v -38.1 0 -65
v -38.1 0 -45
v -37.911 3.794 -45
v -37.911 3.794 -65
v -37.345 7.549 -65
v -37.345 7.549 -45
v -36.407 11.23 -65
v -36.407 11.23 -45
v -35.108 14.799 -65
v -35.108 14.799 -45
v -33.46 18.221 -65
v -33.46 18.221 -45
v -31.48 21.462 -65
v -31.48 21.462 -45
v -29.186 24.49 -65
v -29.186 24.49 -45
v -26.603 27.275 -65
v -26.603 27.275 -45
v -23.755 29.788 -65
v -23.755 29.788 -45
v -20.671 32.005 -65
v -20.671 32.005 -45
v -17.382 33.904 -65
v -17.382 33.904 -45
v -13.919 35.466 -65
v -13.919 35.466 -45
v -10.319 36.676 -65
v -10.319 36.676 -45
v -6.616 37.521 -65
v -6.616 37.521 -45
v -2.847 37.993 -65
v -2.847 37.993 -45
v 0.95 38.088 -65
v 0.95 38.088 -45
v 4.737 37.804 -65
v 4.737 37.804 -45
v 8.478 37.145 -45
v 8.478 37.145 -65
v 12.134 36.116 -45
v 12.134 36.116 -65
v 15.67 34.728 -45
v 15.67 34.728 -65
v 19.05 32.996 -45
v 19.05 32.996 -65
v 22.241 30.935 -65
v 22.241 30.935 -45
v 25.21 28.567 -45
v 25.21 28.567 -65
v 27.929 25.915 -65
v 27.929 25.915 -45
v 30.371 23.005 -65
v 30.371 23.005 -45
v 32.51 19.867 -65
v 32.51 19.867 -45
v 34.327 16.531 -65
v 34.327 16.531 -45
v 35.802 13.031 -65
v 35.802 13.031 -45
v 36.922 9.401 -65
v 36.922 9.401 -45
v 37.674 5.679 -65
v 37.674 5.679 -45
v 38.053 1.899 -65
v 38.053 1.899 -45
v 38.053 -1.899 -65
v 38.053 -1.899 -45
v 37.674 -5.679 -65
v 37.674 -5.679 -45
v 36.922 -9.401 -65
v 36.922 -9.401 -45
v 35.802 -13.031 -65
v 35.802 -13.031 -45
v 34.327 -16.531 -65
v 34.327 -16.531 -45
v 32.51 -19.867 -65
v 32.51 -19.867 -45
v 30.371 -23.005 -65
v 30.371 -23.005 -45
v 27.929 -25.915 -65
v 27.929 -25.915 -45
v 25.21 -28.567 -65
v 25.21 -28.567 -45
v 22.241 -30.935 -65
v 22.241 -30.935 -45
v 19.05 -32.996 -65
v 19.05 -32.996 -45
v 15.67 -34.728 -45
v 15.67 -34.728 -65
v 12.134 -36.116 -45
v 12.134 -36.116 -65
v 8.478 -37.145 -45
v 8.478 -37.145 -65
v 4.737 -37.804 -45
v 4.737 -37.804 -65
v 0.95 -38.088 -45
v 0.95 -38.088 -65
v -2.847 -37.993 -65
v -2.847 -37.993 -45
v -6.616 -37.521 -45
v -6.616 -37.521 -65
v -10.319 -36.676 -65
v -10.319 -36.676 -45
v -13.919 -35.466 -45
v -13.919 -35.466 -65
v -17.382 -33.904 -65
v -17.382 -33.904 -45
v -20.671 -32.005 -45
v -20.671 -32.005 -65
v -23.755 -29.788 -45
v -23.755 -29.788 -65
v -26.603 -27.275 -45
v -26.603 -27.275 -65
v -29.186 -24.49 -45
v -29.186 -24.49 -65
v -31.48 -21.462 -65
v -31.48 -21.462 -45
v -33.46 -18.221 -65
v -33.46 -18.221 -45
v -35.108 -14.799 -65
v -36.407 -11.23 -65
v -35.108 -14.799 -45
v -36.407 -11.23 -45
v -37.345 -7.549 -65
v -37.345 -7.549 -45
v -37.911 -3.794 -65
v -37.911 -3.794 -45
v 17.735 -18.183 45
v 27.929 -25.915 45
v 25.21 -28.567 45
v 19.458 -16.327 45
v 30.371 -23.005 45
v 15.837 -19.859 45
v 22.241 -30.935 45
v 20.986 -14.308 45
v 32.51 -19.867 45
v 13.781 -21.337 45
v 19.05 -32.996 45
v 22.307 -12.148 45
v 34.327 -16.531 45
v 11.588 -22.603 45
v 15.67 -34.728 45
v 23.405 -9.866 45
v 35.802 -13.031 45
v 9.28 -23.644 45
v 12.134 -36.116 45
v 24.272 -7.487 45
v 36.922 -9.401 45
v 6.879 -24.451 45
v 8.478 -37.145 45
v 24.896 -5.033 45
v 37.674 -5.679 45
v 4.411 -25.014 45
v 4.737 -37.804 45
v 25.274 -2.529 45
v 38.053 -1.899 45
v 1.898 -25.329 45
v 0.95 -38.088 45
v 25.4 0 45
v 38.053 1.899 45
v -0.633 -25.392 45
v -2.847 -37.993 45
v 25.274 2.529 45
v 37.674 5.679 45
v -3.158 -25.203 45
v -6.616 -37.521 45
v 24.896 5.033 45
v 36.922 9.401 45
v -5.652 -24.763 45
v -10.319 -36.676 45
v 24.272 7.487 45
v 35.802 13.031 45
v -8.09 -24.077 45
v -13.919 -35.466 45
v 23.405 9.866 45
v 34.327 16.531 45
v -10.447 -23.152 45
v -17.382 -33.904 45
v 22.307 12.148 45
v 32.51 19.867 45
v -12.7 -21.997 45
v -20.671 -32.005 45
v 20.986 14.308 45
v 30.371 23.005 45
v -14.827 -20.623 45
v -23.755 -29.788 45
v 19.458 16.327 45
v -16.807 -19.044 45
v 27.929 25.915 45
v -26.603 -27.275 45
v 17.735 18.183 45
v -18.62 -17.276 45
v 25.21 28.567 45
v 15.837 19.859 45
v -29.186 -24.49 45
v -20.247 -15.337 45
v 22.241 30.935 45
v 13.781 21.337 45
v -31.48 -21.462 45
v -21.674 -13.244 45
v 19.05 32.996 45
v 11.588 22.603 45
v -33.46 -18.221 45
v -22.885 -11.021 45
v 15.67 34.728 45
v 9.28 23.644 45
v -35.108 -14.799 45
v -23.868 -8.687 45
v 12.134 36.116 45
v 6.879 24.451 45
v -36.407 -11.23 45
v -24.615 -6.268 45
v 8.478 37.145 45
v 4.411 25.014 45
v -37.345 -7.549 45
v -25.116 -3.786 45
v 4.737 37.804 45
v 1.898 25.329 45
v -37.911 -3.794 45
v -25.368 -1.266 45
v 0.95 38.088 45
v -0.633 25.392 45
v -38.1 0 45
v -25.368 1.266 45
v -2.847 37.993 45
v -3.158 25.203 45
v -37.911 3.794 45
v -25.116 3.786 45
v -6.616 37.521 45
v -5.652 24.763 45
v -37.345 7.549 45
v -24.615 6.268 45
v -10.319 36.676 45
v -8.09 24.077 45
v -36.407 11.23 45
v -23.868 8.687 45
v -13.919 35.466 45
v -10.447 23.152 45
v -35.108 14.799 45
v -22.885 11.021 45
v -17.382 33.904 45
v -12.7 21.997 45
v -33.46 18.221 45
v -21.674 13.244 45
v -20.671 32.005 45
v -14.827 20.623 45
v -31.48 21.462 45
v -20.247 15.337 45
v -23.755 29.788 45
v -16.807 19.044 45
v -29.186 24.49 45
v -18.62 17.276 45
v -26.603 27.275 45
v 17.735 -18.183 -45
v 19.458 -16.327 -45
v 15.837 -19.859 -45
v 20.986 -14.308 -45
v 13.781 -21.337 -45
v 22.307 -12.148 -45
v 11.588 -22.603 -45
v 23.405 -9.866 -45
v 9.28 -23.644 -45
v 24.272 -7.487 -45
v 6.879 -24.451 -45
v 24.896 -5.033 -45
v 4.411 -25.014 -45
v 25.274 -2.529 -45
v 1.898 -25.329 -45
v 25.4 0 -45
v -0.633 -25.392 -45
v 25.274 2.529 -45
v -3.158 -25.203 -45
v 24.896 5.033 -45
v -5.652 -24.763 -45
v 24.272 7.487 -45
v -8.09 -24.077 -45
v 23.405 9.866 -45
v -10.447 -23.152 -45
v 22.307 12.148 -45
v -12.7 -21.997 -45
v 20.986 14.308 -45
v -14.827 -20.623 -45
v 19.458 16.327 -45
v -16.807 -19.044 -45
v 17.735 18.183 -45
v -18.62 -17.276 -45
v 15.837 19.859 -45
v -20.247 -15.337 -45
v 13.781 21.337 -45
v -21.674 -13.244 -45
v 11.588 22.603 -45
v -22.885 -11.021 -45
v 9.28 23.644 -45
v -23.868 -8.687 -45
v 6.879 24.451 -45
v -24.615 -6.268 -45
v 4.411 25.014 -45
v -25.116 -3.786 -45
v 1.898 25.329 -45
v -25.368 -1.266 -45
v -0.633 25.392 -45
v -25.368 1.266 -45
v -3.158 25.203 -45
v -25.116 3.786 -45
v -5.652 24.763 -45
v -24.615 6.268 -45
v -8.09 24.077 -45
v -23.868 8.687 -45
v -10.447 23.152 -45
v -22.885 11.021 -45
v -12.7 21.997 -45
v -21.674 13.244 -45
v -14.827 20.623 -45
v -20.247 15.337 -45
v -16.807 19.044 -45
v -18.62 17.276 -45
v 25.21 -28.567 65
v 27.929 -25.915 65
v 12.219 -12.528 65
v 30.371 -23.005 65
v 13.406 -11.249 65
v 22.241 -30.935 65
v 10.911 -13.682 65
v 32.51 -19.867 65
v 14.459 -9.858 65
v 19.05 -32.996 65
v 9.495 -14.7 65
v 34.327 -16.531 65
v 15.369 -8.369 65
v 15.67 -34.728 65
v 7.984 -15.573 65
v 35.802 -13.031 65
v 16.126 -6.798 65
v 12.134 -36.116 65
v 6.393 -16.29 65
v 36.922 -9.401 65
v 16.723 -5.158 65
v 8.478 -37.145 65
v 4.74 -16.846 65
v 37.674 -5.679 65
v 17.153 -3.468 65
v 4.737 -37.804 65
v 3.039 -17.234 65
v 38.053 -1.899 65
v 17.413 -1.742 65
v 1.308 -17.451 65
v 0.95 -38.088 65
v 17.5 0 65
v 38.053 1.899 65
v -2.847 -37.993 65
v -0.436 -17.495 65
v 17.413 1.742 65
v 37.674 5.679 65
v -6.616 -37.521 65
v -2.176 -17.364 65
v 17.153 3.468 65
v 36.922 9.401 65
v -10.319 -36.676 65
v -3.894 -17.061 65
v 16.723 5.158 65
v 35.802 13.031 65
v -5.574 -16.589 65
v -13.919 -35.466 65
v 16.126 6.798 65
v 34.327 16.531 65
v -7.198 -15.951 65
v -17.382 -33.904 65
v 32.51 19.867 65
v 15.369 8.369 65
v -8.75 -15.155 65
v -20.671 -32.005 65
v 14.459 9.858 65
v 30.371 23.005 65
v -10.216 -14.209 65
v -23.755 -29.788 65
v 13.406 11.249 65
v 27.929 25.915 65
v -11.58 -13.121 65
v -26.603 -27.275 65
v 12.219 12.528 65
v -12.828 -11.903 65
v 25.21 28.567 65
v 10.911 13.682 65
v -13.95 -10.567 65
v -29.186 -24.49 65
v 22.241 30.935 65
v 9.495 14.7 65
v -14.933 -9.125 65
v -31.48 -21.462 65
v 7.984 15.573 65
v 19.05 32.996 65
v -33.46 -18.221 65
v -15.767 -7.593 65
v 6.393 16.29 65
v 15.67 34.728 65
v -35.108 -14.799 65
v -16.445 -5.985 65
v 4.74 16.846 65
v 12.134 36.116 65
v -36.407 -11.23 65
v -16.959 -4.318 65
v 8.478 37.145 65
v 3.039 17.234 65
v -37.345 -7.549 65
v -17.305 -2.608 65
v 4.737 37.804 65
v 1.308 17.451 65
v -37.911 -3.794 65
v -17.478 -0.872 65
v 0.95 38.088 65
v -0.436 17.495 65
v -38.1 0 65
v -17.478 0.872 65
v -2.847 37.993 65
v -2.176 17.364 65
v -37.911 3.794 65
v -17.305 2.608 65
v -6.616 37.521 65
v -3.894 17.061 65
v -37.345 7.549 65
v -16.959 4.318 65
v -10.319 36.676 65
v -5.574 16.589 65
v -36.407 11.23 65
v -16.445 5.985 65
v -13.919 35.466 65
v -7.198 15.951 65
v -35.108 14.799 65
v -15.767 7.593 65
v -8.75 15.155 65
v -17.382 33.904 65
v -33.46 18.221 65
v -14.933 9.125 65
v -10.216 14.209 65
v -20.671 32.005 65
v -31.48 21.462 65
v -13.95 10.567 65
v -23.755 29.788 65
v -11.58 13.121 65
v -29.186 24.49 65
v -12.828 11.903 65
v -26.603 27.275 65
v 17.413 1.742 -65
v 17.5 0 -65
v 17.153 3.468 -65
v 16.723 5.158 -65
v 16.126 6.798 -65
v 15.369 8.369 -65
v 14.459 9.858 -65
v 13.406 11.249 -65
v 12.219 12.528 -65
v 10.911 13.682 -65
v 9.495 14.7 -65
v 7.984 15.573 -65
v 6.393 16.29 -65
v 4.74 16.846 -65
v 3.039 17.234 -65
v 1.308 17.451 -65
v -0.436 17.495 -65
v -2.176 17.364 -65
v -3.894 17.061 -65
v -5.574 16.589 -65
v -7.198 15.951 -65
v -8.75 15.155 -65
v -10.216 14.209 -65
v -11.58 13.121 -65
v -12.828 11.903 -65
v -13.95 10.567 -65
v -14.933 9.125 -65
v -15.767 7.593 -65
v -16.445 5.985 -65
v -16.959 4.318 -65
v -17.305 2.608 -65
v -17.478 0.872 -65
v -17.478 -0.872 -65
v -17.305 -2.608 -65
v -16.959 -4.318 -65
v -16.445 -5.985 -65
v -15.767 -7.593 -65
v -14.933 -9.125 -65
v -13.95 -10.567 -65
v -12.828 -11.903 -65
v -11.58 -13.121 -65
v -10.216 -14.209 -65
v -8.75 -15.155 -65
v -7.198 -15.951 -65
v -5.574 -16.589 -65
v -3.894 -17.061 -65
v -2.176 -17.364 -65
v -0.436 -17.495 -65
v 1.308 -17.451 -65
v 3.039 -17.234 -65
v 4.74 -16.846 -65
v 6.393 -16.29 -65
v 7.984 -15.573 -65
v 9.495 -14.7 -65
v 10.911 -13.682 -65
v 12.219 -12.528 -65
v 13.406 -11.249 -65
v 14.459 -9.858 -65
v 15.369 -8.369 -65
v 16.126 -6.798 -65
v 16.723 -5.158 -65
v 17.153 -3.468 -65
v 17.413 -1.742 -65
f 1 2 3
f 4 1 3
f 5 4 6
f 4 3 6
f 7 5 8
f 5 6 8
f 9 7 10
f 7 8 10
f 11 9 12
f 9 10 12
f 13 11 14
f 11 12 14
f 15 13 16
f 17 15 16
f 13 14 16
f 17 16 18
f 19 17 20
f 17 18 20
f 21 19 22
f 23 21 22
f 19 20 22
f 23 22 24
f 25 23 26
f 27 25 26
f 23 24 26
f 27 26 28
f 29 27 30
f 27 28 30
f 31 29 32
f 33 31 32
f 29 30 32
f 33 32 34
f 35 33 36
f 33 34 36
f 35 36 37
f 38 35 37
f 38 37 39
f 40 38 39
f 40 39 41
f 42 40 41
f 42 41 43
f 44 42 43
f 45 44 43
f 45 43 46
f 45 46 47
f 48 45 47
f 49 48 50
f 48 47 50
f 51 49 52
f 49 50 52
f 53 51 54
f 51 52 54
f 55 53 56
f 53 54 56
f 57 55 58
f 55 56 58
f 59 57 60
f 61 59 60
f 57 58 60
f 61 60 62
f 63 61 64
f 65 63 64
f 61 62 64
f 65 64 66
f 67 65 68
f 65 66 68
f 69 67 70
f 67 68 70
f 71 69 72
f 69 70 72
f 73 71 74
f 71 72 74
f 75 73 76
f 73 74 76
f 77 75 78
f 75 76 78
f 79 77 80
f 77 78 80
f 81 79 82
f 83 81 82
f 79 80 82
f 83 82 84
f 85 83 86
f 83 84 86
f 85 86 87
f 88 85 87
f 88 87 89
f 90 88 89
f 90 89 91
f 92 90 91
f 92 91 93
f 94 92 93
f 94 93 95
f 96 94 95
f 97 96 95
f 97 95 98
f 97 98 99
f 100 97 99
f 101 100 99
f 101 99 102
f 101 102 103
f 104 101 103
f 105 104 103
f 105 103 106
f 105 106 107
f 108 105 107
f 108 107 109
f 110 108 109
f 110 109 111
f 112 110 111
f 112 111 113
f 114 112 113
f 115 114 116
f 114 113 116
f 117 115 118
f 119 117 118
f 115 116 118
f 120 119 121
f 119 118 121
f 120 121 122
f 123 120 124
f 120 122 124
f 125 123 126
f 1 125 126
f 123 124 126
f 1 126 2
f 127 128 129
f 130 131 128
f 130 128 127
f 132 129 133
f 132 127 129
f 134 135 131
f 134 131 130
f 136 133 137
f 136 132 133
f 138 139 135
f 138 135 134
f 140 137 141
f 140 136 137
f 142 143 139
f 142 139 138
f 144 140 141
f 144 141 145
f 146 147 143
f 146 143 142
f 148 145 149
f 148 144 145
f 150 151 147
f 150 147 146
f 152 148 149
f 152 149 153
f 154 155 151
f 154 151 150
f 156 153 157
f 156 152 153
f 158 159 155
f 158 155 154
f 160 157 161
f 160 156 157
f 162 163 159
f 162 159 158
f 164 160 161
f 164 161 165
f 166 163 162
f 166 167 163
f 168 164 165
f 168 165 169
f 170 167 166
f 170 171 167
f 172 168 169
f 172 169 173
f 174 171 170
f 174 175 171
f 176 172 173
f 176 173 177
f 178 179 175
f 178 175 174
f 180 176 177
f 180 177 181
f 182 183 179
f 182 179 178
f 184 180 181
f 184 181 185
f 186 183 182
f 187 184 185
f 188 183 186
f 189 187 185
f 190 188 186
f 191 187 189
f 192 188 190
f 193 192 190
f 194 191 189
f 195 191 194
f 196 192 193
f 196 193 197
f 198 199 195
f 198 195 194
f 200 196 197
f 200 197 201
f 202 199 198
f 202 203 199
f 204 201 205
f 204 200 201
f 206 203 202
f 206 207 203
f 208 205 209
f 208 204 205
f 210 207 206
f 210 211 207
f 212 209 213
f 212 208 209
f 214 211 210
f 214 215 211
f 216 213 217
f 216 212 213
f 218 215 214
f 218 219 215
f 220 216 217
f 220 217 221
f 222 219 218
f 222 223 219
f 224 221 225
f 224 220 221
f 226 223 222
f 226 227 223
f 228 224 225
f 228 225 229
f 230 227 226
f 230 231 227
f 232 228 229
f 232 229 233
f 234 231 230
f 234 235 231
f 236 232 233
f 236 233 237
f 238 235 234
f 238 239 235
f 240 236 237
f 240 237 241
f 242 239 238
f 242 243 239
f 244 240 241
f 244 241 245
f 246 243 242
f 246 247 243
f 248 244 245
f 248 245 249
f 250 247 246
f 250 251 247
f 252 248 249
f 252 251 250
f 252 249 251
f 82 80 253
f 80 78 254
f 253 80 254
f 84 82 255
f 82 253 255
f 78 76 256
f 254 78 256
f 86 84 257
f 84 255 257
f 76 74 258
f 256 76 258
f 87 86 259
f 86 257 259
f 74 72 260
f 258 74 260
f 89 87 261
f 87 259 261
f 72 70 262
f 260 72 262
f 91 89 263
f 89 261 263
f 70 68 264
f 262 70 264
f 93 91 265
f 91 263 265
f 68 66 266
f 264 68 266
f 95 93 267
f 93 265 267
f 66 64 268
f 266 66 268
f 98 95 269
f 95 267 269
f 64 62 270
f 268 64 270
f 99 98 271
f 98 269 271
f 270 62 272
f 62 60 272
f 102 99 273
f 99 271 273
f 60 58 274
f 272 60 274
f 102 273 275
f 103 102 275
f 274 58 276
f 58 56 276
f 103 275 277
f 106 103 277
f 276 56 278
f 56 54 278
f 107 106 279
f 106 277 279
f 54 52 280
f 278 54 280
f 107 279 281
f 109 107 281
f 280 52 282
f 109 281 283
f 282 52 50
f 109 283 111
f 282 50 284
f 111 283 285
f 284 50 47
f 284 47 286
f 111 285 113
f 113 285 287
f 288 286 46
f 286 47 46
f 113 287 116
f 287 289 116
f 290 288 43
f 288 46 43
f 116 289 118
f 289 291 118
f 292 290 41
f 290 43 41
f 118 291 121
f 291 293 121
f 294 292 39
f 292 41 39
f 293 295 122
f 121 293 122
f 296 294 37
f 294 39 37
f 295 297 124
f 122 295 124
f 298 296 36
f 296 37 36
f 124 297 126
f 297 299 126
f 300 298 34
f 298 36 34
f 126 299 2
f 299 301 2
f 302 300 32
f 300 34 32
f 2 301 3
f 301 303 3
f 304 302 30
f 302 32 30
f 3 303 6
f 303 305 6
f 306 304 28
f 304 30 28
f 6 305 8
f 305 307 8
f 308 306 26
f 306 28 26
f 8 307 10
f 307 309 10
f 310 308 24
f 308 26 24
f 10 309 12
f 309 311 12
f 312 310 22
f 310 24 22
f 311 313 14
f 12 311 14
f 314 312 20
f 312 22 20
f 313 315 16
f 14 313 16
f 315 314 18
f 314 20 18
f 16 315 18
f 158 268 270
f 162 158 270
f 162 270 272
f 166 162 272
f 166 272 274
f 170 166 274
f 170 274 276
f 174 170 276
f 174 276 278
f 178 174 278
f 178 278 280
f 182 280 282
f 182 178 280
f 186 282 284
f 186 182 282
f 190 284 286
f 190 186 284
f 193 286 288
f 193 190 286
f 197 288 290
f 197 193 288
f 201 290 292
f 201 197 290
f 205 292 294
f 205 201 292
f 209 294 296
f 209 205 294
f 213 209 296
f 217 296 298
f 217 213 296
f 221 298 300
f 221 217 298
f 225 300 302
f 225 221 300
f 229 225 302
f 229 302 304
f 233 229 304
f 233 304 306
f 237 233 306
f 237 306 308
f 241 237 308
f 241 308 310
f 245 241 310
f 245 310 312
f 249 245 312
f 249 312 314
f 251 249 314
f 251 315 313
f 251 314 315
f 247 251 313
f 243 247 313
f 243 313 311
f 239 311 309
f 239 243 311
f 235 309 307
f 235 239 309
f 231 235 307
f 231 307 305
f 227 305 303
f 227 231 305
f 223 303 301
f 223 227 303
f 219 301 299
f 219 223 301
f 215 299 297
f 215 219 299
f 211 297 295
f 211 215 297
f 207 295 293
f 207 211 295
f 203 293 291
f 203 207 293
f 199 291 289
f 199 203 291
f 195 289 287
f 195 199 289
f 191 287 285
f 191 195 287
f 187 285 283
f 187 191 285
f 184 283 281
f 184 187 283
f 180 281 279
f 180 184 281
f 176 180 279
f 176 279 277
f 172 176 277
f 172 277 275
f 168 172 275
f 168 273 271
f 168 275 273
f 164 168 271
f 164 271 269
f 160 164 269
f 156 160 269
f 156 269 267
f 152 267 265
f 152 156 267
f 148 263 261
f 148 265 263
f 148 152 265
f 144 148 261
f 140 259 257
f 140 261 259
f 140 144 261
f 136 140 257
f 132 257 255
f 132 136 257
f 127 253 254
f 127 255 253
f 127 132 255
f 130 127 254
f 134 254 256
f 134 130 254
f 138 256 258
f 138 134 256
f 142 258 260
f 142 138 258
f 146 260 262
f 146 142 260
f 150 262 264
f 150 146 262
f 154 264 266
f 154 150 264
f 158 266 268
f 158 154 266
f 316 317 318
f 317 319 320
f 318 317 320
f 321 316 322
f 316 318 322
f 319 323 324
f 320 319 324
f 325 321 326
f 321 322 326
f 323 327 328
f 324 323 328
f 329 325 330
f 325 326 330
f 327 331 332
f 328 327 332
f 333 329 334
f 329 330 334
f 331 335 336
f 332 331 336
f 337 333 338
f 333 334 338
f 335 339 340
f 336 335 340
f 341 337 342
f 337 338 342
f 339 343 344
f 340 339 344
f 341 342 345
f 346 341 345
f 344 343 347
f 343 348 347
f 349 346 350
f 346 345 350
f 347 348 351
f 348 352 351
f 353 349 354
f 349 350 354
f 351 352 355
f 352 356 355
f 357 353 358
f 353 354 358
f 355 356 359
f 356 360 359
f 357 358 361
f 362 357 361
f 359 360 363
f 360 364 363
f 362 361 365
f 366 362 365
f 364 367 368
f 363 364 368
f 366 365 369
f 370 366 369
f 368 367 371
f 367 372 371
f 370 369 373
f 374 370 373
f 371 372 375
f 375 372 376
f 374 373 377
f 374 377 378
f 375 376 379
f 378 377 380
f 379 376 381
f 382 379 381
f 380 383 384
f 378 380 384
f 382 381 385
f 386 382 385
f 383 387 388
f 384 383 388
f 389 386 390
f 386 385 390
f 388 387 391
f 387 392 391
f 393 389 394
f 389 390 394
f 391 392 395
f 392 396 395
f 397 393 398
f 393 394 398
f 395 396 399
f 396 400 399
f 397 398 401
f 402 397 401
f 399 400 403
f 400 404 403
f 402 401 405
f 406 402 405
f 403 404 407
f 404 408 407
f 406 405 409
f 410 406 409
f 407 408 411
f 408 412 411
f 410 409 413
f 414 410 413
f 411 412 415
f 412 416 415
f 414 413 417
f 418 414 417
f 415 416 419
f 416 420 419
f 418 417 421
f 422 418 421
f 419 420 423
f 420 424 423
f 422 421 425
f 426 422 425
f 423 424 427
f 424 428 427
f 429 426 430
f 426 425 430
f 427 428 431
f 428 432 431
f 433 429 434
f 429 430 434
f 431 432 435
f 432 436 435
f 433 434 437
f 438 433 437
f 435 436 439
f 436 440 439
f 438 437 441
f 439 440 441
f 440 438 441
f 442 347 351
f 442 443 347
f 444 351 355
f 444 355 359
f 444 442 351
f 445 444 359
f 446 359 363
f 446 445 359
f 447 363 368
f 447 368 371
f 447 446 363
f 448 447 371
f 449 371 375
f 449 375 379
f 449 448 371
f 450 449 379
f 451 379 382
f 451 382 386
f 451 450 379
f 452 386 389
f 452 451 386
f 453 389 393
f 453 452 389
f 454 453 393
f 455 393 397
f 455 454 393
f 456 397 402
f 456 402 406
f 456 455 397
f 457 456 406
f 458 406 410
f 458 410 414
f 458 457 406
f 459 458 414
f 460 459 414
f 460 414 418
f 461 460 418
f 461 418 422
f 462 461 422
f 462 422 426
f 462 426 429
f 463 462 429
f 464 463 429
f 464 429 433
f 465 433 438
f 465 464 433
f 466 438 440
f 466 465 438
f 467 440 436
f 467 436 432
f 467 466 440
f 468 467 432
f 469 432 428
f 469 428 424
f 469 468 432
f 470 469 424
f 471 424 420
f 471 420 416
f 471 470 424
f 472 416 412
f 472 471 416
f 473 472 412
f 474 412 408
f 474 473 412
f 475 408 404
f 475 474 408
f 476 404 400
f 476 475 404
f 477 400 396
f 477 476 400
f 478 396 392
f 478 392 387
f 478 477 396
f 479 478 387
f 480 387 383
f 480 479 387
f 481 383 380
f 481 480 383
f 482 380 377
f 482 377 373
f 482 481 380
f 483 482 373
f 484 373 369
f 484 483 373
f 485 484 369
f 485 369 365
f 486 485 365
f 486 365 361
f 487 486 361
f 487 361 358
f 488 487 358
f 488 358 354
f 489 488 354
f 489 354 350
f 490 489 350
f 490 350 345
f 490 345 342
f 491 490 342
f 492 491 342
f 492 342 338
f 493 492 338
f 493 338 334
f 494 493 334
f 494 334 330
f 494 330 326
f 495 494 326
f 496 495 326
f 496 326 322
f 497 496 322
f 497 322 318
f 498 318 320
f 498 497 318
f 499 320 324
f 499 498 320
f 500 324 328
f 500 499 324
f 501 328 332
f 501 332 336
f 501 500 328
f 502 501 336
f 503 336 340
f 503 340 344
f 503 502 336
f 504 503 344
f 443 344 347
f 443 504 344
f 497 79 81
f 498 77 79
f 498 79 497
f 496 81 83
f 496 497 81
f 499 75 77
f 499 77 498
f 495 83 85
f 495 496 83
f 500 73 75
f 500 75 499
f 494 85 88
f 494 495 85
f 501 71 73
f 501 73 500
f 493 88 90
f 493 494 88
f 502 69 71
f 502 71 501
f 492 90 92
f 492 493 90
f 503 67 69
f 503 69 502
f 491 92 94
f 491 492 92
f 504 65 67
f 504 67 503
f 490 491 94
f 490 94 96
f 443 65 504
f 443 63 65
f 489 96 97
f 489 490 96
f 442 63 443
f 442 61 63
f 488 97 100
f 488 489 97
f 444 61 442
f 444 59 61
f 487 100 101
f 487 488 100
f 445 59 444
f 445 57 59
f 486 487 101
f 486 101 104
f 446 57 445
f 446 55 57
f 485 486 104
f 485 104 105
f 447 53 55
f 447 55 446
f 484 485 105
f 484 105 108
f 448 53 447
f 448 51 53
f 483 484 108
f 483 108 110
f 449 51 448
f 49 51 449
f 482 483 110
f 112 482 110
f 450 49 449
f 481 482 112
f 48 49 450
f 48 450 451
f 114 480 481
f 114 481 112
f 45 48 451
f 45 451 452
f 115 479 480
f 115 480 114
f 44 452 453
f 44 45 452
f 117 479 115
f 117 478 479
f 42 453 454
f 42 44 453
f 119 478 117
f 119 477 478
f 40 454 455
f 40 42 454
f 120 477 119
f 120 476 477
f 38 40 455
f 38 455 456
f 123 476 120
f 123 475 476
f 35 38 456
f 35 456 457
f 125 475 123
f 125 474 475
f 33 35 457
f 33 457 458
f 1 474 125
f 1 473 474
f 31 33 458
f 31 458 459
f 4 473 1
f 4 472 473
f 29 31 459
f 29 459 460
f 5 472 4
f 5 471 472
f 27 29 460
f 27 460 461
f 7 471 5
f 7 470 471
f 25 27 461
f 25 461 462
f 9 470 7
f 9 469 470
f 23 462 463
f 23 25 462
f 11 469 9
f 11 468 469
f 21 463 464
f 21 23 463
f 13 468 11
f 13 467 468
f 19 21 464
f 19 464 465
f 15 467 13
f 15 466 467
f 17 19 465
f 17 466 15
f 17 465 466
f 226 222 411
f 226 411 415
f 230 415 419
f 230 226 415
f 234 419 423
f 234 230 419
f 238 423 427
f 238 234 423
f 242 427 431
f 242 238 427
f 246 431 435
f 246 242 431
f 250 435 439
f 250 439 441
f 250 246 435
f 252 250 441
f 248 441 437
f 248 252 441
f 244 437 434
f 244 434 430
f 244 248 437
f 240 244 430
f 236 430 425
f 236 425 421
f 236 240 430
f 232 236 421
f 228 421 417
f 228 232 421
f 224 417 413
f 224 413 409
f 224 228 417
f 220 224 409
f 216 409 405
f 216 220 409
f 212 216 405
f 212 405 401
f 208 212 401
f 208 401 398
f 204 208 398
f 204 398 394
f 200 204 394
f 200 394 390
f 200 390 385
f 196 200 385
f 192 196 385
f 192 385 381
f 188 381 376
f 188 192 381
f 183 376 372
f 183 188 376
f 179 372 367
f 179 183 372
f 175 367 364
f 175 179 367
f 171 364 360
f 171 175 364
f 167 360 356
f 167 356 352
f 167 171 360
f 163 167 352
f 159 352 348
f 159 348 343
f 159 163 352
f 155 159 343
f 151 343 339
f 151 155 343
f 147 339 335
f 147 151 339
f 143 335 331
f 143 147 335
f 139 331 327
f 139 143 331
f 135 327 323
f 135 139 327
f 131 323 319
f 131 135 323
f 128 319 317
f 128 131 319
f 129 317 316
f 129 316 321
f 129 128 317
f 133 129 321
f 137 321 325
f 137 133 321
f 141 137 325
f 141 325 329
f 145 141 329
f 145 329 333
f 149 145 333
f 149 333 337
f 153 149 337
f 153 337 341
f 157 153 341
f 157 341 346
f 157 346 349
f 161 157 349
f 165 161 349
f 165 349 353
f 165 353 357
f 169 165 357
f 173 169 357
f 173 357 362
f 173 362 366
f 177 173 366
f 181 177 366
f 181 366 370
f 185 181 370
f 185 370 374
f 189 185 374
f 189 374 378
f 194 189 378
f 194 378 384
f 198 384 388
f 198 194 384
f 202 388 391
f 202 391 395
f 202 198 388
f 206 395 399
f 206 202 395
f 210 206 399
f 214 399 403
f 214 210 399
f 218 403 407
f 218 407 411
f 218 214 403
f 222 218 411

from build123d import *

# Parameters (mm, degrees)
SKETCH1_R           = 25.4
SKETCH1_R_2         = 17.5
BOSS_EXTRUDE1_DEPTH = 65
BOSS_EXTRUDE2_START = -20
SKETCH2_R           = 38.1
SKETCH2_R_2         = 25.4
BOSS_EXTRUDE2_DEPTH = 20


with BuildPart() as part:
    # Sketch1 → Boss-Extrude1 (new, symmetric)
    with BuildSketch(Plane.XY):
        Circle(SKETCH1_R)
        Circle(SKETCH1_R_2, mode=Mode.SUBTRACT)
    extrude(amount=BOSS_EXTRUDE1_DEPTH, both=True)

    # Sketch2 → Boss-Extrude2 (add)
    with BuildSketch(Plane(origin=(0, 0, -65), x_dir=(-1, 0, 0), z_dir=(0, 0, -1)).offset(BOSS_EXTRUDE2_START)):
        Circle(SKETCH2_R)
        Circle(SKETCH2_R_2, mode=Mode.SUBTRACT)
    boss_extrude2 = extrude(amount=BOSS_EXTRUDE2_DEPTH)

    # Mirror1: Boss-Extrude2 across plane
    add(boss_extrude2.mirror(Plane.XY))


solid = part.part
